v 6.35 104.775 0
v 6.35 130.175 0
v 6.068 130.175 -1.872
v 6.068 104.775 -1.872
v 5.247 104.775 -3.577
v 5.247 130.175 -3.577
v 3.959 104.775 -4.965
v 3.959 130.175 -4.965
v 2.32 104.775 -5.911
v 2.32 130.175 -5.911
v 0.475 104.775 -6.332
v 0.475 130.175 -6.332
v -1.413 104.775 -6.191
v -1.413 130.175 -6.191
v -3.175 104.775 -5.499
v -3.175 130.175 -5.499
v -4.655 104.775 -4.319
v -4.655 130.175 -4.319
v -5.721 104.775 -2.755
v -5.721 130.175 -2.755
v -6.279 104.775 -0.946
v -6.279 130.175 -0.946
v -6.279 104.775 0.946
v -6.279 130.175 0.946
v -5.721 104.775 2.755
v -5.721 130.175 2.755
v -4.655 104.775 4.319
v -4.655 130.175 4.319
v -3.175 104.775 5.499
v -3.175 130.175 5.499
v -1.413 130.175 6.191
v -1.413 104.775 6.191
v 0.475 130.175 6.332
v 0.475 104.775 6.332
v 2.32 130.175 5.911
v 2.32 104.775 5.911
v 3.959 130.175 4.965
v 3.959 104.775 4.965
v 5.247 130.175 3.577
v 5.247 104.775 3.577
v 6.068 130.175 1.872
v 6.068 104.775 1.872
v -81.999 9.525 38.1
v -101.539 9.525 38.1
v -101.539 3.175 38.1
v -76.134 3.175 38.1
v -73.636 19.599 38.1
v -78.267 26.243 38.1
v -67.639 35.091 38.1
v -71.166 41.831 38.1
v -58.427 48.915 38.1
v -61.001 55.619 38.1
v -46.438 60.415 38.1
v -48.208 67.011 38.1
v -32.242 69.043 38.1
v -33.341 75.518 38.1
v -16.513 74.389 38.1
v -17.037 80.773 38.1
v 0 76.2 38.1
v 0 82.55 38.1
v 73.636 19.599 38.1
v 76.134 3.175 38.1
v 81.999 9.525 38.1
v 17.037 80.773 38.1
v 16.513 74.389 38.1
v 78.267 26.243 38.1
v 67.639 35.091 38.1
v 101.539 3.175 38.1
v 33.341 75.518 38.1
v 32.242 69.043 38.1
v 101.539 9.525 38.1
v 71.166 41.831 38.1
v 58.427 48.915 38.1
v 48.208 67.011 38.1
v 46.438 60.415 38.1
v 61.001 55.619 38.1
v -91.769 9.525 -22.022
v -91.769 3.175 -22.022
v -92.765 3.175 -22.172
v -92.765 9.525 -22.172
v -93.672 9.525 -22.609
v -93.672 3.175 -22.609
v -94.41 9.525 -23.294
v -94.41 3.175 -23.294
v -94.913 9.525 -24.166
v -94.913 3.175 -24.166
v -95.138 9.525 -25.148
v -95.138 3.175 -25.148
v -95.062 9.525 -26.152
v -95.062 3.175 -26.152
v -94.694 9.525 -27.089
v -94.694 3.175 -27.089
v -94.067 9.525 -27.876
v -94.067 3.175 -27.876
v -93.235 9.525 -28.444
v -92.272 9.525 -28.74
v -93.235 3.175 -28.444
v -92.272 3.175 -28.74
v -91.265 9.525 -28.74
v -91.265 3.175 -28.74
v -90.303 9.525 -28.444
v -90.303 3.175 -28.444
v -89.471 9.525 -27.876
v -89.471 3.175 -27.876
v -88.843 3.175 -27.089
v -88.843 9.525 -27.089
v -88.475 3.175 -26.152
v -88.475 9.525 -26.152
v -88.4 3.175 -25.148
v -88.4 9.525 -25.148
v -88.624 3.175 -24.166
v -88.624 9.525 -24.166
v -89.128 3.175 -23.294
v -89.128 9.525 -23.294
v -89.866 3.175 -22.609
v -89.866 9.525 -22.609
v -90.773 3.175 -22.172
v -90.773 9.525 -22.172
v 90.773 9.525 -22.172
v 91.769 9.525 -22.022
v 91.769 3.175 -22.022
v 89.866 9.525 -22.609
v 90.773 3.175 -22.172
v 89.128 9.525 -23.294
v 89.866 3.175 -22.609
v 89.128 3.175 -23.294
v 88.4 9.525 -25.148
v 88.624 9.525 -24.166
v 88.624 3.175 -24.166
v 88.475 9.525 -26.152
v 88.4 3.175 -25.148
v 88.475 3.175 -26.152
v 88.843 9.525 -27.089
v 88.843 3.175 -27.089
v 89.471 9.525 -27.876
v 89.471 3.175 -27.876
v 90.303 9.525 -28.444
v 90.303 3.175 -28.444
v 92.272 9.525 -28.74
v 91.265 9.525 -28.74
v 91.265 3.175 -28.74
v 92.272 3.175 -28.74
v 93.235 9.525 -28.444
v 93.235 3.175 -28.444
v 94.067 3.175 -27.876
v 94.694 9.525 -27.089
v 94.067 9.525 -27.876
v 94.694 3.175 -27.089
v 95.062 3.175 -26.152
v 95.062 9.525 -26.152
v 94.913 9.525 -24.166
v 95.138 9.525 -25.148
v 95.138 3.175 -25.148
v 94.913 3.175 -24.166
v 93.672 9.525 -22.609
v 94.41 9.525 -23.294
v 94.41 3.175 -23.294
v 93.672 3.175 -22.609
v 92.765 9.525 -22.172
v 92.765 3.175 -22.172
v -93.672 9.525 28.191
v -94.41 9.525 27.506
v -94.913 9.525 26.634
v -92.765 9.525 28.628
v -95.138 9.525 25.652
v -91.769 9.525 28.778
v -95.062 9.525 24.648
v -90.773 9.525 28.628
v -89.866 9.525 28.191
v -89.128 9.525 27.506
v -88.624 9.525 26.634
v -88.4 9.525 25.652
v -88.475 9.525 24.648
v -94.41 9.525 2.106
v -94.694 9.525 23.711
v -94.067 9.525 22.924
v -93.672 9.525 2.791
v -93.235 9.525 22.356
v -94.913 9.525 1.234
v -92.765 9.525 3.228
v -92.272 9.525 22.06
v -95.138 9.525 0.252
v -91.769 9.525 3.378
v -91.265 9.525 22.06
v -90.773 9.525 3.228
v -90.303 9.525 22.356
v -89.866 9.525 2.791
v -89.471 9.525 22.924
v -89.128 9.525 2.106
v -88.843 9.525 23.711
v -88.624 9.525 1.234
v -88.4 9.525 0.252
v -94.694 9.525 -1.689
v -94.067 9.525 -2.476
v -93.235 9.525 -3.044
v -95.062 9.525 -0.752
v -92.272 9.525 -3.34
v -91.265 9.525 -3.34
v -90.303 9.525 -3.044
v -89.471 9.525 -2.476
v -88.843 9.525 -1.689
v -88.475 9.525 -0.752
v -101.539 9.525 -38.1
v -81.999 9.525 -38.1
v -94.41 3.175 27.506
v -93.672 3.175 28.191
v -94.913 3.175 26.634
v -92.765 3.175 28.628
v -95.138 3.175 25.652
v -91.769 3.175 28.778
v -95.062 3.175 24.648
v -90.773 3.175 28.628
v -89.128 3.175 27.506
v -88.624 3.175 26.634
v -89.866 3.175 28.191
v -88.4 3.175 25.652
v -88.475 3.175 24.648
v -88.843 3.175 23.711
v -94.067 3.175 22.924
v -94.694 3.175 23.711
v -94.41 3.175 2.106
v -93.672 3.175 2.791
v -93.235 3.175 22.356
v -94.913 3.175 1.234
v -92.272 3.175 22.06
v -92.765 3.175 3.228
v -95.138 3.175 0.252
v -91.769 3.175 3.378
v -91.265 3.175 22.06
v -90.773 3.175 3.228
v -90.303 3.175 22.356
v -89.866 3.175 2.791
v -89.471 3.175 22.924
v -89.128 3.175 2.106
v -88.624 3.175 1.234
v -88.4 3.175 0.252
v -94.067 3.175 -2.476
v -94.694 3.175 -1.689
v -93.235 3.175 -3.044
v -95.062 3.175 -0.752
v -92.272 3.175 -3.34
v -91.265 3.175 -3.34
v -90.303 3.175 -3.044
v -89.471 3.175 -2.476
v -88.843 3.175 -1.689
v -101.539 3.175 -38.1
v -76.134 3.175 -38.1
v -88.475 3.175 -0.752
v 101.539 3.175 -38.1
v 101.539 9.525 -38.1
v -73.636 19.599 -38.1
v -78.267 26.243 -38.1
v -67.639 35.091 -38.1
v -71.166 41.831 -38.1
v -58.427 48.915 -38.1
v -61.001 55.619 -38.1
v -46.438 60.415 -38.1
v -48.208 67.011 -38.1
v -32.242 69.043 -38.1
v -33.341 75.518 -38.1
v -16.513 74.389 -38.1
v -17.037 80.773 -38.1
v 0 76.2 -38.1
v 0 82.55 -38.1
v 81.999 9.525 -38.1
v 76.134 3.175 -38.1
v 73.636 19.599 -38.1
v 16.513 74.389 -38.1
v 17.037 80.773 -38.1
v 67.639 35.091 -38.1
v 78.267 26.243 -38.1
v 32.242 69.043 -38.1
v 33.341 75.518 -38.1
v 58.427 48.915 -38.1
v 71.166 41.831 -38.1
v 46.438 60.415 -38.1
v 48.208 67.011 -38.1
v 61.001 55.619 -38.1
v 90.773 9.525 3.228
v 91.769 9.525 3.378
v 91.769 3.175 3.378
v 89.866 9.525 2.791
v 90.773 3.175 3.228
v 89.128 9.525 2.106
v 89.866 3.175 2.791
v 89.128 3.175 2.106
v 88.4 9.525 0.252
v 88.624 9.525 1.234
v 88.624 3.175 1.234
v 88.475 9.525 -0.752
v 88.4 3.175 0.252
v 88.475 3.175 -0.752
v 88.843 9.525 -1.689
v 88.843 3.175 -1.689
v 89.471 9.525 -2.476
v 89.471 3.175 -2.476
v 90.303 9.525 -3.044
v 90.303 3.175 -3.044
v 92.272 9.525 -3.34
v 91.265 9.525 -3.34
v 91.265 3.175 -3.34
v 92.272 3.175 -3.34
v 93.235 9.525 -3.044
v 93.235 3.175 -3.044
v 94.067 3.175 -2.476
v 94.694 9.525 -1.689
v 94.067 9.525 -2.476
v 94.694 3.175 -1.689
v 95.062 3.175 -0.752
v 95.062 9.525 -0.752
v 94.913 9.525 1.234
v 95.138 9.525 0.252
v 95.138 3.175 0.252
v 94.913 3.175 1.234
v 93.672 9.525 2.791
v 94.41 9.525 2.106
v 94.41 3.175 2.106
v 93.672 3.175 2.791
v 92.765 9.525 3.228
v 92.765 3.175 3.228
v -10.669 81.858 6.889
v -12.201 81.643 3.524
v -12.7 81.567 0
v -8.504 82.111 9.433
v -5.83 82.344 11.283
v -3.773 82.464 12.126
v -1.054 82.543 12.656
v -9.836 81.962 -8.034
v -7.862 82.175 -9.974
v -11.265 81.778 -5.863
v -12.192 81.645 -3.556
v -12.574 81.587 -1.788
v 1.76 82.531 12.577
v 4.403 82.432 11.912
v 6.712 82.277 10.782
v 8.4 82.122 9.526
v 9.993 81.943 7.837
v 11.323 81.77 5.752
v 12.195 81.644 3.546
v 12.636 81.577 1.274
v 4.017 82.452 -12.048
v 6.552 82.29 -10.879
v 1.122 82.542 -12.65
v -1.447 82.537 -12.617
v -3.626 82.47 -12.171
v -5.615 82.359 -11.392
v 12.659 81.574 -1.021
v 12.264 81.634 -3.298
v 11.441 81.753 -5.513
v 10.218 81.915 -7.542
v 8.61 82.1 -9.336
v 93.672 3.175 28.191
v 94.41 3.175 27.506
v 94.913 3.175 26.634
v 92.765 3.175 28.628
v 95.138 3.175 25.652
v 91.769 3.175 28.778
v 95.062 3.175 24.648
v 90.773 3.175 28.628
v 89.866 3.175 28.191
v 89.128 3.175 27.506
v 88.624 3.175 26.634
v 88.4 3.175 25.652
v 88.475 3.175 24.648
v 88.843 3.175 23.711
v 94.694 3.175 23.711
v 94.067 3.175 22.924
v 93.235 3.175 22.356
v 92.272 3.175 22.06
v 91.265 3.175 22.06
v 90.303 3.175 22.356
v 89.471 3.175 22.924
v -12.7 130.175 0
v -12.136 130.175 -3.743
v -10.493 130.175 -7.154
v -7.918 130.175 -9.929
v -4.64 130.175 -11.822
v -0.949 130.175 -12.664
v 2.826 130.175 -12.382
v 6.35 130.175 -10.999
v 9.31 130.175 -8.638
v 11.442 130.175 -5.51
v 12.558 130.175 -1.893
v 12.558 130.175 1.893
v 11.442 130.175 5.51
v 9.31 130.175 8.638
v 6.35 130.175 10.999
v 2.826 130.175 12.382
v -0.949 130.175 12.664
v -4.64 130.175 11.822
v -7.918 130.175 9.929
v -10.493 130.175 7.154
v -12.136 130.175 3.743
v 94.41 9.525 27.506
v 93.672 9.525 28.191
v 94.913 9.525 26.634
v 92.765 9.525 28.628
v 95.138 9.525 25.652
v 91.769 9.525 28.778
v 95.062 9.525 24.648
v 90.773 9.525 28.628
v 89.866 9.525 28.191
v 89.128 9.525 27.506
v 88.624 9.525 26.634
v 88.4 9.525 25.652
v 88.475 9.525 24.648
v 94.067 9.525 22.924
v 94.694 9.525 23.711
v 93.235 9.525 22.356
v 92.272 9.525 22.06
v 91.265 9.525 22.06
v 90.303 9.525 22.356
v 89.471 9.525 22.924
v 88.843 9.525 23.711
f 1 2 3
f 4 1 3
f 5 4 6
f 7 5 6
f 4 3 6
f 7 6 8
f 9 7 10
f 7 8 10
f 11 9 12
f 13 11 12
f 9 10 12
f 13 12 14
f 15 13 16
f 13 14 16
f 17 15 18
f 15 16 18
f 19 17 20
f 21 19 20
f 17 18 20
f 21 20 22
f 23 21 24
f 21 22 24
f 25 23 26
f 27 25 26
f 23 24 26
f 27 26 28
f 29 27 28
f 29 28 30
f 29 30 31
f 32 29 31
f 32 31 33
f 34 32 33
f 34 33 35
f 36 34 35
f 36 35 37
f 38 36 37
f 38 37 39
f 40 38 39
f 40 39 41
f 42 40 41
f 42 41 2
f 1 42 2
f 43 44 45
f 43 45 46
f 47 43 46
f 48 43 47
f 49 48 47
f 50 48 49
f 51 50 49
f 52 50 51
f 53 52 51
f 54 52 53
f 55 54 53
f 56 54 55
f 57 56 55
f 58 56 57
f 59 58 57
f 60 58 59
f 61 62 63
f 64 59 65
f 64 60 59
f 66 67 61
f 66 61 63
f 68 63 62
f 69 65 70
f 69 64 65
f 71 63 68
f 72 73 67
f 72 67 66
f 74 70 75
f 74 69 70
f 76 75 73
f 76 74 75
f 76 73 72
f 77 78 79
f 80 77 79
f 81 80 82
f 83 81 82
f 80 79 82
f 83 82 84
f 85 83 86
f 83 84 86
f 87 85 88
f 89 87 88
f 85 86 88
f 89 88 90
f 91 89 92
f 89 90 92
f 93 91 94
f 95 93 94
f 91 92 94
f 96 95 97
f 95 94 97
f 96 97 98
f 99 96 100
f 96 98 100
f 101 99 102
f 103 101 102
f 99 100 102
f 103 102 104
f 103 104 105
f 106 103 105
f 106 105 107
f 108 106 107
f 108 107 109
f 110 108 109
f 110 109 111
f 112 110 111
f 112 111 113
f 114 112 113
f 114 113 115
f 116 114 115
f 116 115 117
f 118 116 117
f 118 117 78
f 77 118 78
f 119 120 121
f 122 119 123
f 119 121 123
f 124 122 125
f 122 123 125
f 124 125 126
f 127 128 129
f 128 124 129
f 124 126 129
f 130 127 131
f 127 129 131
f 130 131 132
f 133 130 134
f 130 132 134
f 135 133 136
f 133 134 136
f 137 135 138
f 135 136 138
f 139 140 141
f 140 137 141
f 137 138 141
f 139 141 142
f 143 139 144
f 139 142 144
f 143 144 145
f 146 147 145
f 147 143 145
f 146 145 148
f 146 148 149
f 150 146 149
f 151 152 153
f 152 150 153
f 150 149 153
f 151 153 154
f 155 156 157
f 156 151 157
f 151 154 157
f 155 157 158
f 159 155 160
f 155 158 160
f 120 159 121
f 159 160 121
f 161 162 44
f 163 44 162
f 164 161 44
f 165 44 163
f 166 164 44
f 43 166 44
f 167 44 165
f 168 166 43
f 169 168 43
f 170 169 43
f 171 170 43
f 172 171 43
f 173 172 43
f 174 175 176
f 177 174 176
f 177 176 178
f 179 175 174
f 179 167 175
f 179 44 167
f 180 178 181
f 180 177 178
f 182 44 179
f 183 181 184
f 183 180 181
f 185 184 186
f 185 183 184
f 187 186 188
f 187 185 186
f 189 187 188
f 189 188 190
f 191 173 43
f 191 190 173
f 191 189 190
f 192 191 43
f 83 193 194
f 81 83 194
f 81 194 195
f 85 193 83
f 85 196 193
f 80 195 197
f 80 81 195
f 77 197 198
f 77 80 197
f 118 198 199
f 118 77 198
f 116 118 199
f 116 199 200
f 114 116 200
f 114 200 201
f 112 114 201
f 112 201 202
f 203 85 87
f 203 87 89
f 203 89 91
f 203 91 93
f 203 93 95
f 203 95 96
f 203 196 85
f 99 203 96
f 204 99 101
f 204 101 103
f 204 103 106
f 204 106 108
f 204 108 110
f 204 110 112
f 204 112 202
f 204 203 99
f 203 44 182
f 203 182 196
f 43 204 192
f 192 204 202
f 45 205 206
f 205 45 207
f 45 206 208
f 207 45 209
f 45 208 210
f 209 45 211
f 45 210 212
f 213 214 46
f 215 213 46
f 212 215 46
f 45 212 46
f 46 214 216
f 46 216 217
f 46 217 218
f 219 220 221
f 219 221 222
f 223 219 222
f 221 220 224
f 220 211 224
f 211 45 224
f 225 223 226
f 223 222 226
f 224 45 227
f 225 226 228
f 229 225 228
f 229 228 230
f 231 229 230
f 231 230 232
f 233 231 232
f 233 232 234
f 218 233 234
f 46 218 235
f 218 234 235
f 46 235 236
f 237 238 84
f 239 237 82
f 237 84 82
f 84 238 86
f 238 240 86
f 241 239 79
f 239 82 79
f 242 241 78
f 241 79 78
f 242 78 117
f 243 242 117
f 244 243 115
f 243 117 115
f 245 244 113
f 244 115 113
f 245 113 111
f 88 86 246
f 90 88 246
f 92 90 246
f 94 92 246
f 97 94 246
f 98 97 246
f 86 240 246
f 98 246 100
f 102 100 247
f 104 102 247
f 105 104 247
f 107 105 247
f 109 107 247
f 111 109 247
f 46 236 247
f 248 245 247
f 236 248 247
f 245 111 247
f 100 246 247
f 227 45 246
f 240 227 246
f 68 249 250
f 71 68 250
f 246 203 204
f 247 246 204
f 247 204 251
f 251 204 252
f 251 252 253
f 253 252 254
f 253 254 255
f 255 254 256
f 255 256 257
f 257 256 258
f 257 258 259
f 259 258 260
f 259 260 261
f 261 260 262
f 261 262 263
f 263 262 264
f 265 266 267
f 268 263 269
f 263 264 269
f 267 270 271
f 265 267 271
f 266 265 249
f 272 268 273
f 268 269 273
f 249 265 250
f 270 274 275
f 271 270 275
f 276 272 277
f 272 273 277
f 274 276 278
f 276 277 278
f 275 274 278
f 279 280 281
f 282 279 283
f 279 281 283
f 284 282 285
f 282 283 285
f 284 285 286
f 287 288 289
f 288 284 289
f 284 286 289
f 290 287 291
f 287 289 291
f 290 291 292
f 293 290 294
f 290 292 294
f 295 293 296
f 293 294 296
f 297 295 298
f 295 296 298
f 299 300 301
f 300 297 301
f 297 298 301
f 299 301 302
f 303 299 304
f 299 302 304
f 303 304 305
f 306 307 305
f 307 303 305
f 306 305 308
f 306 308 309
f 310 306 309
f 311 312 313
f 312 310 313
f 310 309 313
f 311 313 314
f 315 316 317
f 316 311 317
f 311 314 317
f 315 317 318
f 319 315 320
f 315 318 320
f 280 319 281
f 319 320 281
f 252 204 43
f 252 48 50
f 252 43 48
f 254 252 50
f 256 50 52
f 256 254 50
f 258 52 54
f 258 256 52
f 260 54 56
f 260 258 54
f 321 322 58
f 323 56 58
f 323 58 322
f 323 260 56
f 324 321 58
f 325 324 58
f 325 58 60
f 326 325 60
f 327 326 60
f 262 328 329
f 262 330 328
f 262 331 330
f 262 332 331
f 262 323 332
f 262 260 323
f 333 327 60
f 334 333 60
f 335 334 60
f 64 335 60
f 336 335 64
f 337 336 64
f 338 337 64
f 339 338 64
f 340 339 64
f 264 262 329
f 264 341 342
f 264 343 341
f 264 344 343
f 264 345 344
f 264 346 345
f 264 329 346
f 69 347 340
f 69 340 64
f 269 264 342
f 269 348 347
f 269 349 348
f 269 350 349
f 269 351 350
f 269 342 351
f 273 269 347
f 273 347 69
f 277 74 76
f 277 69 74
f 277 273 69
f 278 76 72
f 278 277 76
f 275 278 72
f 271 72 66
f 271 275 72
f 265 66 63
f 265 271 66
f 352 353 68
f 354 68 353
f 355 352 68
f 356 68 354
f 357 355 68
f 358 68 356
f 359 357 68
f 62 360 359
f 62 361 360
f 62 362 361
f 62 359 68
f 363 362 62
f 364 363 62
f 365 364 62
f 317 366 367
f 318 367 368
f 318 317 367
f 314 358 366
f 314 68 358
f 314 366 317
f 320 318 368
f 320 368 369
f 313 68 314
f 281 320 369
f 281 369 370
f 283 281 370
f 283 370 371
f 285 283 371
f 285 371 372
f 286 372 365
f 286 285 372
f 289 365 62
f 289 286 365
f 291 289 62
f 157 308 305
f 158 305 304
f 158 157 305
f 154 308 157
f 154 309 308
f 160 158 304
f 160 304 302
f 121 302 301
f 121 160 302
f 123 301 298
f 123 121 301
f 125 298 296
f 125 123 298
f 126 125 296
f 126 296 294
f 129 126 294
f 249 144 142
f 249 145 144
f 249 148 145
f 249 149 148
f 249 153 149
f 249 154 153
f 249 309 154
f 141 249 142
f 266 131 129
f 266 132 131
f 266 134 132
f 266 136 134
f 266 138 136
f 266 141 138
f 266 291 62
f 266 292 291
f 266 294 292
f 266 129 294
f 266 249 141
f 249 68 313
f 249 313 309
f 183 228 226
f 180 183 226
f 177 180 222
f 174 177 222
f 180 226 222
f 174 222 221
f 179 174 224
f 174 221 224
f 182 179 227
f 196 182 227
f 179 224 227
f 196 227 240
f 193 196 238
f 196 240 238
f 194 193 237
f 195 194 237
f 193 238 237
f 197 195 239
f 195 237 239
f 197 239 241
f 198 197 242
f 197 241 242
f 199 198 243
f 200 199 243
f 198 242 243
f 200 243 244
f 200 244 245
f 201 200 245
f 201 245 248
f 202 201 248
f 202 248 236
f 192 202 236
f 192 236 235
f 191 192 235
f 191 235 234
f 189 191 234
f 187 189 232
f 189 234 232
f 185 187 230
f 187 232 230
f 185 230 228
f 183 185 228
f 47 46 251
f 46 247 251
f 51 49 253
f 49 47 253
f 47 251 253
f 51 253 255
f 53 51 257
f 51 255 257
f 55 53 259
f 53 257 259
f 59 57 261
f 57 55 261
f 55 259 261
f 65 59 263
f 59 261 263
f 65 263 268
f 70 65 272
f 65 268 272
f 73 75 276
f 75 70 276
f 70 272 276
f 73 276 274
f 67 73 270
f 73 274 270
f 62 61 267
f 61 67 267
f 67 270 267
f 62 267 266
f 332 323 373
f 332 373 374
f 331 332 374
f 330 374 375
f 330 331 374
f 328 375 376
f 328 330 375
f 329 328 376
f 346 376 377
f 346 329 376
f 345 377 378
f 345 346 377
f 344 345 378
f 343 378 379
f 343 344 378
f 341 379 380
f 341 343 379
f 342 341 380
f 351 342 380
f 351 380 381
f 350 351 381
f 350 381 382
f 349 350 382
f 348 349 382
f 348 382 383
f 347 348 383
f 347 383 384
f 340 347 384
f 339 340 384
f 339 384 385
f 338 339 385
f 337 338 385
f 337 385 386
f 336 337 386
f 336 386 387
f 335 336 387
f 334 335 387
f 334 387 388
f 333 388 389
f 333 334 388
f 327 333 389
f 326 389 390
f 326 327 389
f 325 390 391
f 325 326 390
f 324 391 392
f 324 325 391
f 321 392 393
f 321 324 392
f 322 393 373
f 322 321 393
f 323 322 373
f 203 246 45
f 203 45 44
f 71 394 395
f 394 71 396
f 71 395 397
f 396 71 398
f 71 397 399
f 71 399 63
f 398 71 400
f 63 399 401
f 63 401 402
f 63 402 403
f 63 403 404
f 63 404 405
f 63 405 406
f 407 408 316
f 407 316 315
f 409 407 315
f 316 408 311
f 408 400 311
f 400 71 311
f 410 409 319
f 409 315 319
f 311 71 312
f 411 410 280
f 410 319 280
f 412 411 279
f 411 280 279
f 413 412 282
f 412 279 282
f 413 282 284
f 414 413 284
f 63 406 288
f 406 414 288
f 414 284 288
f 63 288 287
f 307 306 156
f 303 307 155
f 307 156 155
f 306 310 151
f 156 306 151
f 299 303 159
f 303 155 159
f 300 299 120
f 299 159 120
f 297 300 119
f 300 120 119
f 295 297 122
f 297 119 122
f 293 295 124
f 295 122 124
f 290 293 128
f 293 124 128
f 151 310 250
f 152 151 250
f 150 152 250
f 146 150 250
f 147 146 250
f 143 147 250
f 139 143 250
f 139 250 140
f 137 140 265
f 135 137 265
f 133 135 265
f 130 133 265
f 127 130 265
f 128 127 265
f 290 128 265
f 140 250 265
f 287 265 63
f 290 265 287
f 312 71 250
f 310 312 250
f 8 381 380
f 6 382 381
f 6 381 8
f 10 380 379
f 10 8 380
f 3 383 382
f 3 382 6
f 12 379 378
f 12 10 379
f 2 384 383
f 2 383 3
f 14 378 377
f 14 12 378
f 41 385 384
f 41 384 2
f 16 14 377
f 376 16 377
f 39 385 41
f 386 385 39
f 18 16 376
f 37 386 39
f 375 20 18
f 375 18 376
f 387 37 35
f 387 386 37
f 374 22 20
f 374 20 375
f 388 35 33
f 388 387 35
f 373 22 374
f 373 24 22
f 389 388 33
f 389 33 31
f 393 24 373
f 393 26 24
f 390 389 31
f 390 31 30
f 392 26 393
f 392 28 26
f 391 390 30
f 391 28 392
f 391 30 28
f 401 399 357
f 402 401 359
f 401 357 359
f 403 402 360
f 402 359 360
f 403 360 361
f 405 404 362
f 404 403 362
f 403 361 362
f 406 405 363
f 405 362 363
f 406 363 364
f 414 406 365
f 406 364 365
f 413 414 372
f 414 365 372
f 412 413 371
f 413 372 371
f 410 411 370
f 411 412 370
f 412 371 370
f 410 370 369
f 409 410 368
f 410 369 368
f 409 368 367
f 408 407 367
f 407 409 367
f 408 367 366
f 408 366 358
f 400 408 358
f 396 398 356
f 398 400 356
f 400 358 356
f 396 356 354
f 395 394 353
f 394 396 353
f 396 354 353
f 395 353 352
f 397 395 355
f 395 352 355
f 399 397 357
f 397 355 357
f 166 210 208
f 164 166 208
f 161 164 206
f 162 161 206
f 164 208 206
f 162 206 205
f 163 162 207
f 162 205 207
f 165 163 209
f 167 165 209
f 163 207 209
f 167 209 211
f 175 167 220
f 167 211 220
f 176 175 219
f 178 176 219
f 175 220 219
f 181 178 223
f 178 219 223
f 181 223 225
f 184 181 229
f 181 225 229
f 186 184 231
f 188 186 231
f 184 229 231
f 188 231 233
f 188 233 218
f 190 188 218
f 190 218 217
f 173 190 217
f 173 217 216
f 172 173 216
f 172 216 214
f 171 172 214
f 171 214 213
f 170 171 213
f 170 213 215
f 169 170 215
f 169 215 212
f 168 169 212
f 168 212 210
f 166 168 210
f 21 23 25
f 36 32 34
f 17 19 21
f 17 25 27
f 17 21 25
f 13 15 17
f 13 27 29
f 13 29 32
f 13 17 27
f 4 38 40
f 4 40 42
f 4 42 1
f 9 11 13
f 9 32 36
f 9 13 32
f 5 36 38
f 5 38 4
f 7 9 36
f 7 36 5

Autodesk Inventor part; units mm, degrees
ref_plane "YZ Plane" through (0, 0, 0) normal (1, 0, 0) x (0, 1, 0)
ref_plane "XY Plane" through (0, 0, 0) normal (0, 0, 1) x (1, 0, 0)
sketch "Sketch8" plane through (0, 0, 0) normal (0, 0, 1) x (1, 0, 0)
  arc A0 (76.1338, 3.175) -> (-76.1338, 3.175) centre (0, 0) ccw
  arc A1 (81.9986, 9.525) -> (-81.9986, 9.525) centre (0, 0) ccw
  line L0 (-82.4889, 3.175) -> (-101.5389, 3.175)
  line L1 (-101.5389, 3.175) -> (-101.5389, 9.525)
  line L2 (-101.5389, 9.525) -> (-81.9986, 9.525)
  line L3 (0, 0) -> (0, 82.55) construction
  line L4 (-82.4889, 3.175) -> (-76.1338, 3.175)
  line L5 (82.4889, 3.175) -> (101.5389, 3.175)
  line L6 (101.5389, 3.175) -> (101.5389, 9.525)
  line L7 (101.5389, 9.525) -> (81.9986, 9.525)
  line L8 (82.4889, 3.175) -> (76.1338, 3.175)
  dimension "d52" = 152.4
  dimension "d53" = 6.35
  dimension "d54" = 19.05
  dimension "d55" = 3.175
  dimension "d56" = 6.35
extrude "Extrusion5" add sketch "Sketch8" along normal mid plane 76.2
sketch "Sketch9" plane through (-101.5389, 9.525, 38.1) normal (0, 1, 0) x (1, 0, 0)
  line L0 (19.5403, 0) -> (0, 0) construction
  line L1 (9.7701, 0) -> (9.7701, 76.2) construction
  line L2 (25.4051, 76.2) -> (0, 76.2) construction
  line L3 (9.7701, 25.4) -> (9.7701, 101.6) construction
  line L4 (9.7701, 50.8) -> (9.7701, 127) construction
  point P0 (101.5389, 38.1)
  point P1 (9.7701, 12.7)
  point P2 (9.7701, 38.1)
  point P3 (9.7701, 63.5)
  dimension "d59" = 12.7
  dimension "d62" = 25.4
hole "Hole3" at (-91.7688, 9.525, 25.4) at (-91.7688, 9.525, 0) at (-91.7688, 9.525, -25.4) direction (0, -1, 0) diameter 6.7564 end through all clearance for "Socket Head Cap Screw" size "1/4" standard "Ansi Unified Screw Threads"
mirror "Mirror3" about plane through (0, 0, 0) normal (1, 0, 0) of "Hole3"
ref_plane "Work Plane7" through (0, 79.375, 0) normal (0, 1, 0) x (-1, 0, 0)
sketch "Sketch20" plane through (0, 79.375, 0) normal (0, 1, 0) x (-1, 0, 0)
  circle A0 centre (0, 0) radius 12.7
  dimension "d101" = 25.4
extrude "Extrusion11" add sketch "Sketch20" along normal blind 50.8
sketch "Sketch22" plane through (0, 130.175, 0) normal (0, 1, 0) x (1, 0, 0)
  circle A0 centre (0, 0) radius 6.35
  dimension "d111" = 12.7
extrude "Extrusion13" cut sketch "Sketch22" against normal blind 25.4
properties part number "tubeBracketV02" material "ABS Plastic"
